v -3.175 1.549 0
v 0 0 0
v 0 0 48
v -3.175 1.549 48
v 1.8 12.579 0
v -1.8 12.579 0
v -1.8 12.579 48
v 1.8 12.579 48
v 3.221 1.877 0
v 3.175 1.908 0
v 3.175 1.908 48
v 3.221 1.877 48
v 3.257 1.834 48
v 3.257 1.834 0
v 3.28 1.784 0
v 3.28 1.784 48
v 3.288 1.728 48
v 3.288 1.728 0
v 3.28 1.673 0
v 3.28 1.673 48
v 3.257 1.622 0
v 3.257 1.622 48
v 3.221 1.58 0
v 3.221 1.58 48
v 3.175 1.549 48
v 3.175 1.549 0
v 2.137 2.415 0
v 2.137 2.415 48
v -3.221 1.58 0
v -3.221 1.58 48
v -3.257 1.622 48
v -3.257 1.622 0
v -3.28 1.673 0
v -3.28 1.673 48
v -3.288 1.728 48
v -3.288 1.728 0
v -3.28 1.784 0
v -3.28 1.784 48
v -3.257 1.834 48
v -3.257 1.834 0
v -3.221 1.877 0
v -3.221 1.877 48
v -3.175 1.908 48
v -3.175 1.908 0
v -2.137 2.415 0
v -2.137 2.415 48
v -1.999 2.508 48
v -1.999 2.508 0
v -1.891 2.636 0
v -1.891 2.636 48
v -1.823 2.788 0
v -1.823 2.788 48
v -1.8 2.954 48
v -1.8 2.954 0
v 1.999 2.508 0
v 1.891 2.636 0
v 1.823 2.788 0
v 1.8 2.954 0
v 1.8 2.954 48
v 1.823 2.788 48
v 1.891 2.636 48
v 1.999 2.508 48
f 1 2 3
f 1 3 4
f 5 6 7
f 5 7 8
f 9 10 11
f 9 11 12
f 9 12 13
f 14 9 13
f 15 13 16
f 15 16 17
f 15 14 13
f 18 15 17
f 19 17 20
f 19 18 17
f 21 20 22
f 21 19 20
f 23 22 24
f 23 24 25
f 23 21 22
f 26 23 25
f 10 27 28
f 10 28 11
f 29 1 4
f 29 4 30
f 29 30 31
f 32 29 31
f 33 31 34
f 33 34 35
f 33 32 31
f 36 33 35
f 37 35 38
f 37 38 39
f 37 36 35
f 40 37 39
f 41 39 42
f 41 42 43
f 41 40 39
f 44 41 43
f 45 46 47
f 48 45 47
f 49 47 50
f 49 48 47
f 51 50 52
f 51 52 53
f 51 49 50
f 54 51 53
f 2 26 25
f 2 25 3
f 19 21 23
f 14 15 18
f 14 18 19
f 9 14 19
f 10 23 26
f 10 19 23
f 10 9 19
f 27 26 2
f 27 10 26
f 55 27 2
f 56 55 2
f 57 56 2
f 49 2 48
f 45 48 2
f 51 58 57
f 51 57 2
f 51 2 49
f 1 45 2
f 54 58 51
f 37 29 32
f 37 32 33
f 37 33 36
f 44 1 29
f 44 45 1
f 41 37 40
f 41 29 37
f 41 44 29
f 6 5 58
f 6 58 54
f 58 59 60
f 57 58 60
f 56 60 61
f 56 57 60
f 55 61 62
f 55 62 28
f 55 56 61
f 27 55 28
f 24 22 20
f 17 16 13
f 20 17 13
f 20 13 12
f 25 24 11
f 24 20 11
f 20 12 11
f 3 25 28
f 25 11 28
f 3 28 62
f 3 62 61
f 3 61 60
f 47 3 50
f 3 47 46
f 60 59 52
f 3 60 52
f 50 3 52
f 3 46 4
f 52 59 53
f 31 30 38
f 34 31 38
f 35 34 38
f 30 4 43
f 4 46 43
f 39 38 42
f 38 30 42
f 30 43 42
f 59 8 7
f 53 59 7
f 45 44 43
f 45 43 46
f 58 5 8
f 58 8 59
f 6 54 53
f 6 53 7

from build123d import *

# Parameters (mm, degrees)
ESTRUSIONE_ESTRUSIONE1_DEPTH = 48


with BuildPart() as part:
    # Schizzo1 → Estrusione-Estrusione1 (new body)
    with BuildSketch(Plane.XY):
        with BuildLine():
            Line((0, 0), (-3.175204989, 1.548650948))
            ThreePointArc((-3.175204989, 1.548650948), (-3.287530759, 1.728409758), (-3.175204989, 1.908168567))
            Line((-3.175204989, 1.908168567), (-2.136976869, 2.414546255))
            ThreePointArc((-2.136976869, 2.414546255), (-1.891170699, 2.635871124), (-1.799999557, 2.953822683))
            Line((-1.799999557, 2.953822683), (-1.799999557, 12.578901072))
            Line((-1.799999557, 12.578901072), (1.799999557, 12.578901072))
            Line((1.799999557, 12.578901072), (1.799999557, 2.953822683))
            ThreePointArc((1.799999557, 2.953822683), (1.891170699, 2.635871124), (2.136976869, 2.414546255))
            Line((2.136976869, 2.414546255), (3.175204989, 1.908168567))
            ThreePointArc((3.175204989, 1.908168567), (3.287530759, 1.728409758), (3.175204989, 1.548650948))
            Line((3.175204989, 1.548650948), (0, 0))
        make_face()
    extrude(amount=ESTRUSIONE_ESTRUSIONE1_DEPTH)


solid = part.part
